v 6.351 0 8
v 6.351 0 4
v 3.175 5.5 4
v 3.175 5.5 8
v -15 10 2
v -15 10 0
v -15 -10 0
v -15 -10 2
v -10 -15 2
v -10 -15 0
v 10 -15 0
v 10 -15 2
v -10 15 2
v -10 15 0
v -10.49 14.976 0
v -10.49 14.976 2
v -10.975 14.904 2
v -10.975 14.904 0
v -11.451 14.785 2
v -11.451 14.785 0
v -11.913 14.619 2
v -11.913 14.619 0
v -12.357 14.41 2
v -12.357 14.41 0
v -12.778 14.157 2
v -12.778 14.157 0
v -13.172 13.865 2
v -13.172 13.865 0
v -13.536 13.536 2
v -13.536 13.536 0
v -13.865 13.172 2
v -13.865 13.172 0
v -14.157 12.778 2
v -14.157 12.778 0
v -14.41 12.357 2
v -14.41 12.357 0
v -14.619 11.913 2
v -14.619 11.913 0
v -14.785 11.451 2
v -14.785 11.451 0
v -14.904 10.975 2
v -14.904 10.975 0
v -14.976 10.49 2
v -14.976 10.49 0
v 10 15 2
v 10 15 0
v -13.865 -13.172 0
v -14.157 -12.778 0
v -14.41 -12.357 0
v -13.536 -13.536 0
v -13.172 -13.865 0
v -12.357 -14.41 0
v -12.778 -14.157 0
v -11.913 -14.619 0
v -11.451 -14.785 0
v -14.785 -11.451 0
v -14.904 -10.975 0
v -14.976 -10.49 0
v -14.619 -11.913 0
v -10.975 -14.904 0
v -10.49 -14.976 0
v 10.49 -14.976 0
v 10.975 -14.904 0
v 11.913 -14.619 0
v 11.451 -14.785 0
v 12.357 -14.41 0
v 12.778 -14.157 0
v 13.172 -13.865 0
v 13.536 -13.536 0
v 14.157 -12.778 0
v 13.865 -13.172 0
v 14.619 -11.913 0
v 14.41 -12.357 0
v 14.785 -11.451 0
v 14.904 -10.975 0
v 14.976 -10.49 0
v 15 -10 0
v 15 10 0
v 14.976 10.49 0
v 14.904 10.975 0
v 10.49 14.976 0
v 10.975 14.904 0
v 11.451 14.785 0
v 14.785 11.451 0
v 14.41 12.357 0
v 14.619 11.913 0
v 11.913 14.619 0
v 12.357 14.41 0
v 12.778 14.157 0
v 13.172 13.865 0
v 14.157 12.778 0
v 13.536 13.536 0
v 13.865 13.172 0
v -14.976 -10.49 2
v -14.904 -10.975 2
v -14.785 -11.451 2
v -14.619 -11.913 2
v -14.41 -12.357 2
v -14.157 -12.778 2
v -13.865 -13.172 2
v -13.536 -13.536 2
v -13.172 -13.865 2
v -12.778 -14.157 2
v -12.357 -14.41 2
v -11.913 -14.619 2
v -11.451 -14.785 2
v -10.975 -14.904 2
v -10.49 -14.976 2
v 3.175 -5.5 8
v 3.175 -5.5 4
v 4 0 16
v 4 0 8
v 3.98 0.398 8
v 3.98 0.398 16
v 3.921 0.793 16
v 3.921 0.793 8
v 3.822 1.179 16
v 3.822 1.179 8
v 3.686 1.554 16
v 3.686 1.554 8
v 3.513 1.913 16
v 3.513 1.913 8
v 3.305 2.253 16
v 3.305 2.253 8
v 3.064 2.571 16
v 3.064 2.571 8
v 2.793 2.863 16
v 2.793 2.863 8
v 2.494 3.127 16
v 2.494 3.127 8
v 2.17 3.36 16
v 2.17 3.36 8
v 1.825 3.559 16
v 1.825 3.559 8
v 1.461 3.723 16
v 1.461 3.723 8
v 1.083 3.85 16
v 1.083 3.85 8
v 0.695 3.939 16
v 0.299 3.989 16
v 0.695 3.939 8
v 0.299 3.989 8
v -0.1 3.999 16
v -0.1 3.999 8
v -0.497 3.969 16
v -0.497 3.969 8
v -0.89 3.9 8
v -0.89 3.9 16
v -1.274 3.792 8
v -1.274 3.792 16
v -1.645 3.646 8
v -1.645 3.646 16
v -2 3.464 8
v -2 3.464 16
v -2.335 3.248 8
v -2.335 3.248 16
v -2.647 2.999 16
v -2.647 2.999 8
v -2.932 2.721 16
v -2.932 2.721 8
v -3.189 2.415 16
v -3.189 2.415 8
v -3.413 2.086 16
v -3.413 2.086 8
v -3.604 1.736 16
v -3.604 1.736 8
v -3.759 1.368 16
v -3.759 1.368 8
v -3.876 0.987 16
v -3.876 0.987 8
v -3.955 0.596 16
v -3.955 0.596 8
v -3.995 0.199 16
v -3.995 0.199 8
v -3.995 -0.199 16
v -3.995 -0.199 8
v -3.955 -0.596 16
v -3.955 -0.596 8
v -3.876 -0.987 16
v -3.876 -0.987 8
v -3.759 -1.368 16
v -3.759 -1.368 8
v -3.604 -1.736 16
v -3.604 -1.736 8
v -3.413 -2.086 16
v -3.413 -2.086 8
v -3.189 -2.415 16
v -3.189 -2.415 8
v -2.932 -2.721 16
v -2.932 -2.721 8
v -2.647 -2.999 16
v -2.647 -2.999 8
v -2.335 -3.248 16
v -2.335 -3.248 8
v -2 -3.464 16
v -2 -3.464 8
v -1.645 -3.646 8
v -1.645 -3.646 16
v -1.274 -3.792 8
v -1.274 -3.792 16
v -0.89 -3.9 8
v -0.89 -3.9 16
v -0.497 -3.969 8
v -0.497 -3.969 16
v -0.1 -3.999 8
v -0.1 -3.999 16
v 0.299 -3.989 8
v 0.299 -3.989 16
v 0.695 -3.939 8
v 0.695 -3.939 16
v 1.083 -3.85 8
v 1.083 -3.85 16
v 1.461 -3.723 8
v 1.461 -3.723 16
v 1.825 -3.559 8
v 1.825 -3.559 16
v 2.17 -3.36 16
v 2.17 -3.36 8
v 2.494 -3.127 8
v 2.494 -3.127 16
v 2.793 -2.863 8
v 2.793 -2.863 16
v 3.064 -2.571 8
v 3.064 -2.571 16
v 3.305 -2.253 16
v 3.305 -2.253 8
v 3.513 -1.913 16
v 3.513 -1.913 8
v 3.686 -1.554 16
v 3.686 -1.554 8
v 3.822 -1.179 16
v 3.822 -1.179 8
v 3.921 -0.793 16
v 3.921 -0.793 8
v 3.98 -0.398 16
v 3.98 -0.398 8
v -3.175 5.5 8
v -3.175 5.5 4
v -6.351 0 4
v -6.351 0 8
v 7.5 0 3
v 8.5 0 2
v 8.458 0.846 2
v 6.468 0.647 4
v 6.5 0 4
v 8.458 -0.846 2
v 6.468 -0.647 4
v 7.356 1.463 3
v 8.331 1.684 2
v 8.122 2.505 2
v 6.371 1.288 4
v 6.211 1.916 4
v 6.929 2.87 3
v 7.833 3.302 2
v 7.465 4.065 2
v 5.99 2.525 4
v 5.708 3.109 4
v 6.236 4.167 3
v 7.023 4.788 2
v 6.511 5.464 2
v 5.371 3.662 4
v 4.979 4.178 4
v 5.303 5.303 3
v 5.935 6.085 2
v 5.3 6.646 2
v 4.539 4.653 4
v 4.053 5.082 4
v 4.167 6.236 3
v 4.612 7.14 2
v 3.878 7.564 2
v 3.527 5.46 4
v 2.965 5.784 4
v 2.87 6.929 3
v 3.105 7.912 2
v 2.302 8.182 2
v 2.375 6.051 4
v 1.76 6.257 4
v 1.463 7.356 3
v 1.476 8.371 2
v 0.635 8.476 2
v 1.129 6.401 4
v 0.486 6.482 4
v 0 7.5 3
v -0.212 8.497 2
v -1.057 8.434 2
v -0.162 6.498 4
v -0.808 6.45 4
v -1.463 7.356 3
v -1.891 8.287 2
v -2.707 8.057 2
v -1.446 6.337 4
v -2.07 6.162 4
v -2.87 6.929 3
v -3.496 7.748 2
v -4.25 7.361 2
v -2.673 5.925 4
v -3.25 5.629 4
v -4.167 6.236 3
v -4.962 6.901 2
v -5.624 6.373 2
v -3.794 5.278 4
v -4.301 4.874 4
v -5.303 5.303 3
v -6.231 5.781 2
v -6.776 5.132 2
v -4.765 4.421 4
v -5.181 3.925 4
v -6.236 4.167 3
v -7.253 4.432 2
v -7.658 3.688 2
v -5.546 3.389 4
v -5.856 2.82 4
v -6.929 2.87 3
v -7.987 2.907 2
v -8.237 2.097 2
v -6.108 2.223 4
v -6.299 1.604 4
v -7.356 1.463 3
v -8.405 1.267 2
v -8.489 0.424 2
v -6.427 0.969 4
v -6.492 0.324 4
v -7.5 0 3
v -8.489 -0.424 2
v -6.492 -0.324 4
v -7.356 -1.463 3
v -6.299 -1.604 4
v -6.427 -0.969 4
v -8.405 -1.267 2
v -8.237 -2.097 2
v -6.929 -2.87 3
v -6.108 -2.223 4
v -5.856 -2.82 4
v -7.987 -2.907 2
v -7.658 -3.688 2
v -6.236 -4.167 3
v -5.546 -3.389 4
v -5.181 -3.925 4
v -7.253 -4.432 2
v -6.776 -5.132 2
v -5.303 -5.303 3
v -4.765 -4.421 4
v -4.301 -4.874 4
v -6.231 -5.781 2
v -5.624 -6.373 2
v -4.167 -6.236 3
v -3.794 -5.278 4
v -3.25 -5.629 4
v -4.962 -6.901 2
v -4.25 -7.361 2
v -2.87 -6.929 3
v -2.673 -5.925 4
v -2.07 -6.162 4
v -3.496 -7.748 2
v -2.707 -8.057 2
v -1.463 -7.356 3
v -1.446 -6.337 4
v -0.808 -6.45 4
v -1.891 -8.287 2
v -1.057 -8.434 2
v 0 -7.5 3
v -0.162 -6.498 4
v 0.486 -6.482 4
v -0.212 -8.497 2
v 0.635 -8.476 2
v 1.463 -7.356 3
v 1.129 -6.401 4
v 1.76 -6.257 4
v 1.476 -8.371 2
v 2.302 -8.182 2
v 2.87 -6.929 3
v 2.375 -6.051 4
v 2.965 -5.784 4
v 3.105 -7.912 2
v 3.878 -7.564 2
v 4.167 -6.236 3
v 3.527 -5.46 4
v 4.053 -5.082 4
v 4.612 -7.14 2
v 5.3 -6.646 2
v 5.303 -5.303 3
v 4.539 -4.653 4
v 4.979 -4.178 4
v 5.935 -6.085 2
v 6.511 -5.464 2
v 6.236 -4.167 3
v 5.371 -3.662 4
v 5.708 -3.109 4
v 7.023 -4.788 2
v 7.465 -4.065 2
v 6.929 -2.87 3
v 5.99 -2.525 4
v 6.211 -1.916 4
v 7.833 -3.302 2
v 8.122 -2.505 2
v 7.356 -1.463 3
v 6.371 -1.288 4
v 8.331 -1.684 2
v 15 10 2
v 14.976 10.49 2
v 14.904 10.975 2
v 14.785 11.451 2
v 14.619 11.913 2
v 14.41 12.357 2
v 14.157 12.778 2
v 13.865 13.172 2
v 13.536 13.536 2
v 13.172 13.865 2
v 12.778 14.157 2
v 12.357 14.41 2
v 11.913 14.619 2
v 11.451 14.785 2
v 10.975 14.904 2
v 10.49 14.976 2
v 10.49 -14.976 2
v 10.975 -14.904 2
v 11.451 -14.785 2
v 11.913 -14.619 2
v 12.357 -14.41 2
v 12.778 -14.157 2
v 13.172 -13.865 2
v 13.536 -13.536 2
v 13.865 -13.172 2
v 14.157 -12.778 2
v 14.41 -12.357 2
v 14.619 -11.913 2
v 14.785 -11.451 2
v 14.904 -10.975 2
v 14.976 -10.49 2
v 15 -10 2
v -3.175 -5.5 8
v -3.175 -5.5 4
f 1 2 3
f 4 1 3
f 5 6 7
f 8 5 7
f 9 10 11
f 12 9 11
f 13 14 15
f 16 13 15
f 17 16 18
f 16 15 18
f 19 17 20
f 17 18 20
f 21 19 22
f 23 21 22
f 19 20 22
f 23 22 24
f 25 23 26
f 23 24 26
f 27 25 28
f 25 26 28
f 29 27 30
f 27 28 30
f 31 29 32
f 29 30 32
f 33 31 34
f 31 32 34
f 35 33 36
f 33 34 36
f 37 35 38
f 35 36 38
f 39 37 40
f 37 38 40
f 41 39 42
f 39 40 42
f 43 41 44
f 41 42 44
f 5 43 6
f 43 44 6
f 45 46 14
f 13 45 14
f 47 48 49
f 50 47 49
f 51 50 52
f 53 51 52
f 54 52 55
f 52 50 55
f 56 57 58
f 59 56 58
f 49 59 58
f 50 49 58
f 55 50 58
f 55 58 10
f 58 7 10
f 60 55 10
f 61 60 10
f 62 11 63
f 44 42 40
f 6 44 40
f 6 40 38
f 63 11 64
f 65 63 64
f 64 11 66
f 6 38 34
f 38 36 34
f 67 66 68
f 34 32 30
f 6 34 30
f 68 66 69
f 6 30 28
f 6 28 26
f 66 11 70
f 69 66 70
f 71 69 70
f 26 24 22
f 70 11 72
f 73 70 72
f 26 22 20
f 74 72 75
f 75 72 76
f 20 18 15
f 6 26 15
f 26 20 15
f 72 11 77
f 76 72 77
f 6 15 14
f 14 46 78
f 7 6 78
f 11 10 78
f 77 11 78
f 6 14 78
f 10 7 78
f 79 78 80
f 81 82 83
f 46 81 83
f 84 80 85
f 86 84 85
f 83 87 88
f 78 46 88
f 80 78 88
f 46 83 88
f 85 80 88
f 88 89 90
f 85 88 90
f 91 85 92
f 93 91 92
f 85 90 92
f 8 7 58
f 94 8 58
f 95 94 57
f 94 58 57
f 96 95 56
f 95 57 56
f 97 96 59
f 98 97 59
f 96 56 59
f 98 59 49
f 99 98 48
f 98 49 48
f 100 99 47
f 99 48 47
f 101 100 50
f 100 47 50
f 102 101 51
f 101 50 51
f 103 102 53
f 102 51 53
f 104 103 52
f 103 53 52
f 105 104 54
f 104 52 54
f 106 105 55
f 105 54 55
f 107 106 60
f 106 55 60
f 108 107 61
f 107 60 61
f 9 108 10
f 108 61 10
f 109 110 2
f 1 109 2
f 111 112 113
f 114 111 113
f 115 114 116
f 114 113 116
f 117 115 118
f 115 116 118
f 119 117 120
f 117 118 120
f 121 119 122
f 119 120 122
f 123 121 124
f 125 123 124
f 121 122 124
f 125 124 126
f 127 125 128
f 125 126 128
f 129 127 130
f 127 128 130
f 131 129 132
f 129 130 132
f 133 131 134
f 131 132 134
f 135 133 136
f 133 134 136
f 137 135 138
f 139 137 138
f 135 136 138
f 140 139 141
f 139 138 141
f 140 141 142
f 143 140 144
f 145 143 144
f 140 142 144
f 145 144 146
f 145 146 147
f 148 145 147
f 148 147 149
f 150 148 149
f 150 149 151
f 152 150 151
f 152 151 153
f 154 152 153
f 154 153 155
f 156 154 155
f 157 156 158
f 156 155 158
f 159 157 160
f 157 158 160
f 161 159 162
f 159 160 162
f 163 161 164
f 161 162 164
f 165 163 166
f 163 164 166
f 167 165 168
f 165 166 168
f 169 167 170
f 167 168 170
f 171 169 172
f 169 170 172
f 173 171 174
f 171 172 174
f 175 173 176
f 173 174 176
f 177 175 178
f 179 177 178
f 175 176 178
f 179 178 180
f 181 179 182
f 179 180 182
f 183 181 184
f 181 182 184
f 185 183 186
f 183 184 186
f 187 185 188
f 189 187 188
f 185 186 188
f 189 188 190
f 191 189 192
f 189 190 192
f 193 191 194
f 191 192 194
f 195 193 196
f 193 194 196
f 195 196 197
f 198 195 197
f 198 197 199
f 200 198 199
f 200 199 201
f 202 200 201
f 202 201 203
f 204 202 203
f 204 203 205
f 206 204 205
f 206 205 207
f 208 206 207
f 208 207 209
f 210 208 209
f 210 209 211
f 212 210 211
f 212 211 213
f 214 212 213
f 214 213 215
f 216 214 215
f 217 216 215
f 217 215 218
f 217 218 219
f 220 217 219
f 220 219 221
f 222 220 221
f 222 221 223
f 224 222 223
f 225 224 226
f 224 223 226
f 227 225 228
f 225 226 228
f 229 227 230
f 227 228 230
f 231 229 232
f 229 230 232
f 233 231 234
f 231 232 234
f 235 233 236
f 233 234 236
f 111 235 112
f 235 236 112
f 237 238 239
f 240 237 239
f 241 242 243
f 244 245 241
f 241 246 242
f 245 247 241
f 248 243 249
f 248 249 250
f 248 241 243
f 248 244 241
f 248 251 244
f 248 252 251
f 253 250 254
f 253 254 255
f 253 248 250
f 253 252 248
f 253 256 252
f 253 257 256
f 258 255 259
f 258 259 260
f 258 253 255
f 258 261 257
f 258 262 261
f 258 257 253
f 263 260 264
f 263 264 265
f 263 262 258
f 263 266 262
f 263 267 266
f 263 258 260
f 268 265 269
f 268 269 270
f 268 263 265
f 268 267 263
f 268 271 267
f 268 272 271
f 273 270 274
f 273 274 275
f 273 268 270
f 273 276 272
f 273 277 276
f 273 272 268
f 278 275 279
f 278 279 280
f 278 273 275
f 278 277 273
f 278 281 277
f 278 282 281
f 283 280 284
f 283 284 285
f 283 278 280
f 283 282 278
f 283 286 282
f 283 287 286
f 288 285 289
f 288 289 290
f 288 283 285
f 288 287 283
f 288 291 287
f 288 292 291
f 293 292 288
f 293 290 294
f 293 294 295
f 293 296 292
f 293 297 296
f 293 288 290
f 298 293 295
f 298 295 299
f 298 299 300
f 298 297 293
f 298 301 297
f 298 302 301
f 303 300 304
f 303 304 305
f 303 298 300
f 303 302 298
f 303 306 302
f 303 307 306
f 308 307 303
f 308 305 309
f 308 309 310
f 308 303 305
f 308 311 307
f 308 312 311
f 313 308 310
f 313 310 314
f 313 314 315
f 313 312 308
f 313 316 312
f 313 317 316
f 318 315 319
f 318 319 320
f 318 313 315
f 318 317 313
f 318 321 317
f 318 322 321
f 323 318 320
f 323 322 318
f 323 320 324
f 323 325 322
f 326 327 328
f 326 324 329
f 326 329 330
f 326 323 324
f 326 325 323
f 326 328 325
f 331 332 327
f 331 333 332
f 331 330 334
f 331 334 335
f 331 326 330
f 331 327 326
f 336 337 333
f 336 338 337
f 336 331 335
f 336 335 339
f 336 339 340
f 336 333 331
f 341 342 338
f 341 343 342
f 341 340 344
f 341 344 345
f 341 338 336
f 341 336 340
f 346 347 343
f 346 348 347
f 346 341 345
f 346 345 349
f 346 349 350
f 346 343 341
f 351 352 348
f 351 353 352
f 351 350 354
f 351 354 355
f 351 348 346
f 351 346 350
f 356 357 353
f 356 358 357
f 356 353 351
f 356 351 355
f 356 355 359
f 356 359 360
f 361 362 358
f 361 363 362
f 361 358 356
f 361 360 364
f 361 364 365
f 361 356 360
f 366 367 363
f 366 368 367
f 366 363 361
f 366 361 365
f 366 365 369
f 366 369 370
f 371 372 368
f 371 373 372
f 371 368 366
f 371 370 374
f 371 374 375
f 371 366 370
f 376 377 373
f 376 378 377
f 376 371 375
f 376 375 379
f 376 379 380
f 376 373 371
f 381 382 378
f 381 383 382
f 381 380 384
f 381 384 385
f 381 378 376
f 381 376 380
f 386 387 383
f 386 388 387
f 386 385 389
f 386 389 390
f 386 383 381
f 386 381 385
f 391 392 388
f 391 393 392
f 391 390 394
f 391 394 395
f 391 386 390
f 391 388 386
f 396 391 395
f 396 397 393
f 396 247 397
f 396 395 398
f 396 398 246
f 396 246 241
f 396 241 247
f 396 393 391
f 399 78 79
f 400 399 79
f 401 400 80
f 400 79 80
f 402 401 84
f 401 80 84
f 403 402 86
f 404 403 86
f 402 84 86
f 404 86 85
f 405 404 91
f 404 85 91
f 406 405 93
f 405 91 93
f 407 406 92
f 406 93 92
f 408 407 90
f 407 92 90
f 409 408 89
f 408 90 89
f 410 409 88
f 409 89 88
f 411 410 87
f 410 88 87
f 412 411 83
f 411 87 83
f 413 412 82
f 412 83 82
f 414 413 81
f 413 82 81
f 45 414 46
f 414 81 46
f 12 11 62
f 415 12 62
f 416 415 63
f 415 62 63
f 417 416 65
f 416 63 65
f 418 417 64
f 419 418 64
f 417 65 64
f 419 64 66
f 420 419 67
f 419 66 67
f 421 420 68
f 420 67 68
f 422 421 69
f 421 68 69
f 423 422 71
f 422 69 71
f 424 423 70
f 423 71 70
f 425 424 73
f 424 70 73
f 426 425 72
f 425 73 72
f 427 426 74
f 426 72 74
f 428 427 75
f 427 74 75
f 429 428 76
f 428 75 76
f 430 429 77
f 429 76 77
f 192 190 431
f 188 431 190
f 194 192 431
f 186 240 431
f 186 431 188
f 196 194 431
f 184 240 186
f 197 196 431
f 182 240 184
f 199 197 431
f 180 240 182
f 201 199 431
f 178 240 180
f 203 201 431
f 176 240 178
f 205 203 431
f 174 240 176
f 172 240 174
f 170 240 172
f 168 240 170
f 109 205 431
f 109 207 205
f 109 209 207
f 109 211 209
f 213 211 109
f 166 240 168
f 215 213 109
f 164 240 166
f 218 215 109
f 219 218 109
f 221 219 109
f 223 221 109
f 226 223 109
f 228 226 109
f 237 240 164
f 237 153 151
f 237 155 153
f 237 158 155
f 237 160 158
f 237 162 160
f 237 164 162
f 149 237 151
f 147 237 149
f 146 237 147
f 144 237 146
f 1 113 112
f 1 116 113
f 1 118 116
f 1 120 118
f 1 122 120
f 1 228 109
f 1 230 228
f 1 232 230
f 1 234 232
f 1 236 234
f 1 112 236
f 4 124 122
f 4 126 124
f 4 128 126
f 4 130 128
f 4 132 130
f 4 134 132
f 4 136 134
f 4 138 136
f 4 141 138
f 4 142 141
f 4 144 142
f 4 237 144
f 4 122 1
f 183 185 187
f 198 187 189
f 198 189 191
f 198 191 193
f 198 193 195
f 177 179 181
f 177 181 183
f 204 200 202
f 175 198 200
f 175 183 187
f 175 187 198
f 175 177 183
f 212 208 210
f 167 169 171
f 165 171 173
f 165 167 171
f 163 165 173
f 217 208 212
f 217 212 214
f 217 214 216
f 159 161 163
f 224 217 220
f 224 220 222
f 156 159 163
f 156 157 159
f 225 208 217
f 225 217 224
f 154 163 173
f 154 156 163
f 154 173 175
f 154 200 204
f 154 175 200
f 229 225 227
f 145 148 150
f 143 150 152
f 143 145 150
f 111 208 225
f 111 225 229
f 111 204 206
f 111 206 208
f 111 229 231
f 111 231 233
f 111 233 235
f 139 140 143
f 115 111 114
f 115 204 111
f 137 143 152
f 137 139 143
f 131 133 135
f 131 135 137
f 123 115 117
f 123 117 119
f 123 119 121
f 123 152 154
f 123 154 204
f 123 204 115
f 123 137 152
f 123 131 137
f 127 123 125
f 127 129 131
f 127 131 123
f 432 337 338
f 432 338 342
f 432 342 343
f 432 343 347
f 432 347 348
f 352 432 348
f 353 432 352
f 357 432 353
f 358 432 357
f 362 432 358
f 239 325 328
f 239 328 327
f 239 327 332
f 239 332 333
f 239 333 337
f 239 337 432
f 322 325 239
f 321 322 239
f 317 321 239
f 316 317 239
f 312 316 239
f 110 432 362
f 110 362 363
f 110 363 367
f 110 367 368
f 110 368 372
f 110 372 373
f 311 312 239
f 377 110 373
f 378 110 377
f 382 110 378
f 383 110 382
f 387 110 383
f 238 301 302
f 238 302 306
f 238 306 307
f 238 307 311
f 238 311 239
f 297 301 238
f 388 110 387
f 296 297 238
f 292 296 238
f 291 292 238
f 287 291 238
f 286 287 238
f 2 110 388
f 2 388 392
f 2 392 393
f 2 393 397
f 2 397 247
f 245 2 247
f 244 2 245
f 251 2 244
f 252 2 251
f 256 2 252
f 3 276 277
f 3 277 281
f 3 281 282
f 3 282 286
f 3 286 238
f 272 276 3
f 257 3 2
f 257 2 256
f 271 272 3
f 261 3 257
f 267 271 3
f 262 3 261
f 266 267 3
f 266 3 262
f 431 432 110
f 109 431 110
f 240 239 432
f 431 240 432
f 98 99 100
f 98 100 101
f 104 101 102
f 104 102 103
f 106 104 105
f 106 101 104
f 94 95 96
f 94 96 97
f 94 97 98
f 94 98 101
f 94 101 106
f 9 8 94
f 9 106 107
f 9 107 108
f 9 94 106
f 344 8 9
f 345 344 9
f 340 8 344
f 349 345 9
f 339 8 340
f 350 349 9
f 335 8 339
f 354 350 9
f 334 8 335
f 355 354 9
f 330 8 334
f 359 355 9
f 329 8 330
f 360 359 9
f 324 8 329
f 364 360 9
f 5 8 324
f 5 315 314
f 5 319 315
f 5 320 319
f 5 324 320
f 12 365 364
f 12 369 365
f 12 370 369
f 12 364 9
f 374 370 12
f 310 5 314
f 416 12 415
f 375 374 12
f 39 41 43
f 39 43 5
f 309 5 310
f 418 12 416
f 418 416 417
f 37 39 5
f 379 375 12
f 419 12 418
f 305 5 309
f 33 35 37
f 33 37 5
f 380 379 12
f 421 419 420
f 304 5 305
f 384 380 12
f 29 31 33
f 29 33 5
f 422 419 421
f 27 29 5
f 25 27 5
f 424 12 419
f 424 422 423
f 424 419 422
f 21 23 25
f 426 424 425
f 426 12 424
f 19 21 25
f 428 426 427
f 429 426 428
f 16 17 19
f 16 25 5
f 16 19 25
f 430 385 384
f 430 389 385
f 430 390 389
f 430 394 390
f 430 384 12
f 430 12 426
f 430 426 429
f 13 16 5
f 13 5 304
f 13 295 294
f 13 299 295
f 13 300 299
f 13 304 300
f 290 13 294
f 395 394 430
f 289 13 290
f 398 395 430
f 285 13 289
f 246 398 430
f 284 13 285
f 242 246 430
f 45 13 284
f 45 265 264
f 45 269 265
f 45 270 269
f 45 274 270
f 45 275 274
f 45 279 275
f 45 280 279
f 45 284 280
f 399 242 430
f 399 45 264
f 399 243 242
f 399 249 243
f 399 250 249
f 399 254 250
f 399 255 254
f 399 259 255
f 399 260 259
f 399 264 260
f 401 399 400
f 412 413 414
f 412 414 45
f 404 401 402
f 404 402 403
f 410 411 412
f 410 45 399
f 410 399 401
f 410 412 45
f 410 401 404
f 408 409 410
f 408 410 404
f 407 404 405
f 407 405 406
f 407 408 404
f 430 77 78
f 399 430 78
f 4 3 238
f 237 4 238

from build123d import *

# Parameters (mm, degrees)
F1_DEPTH = 2
F2_R     = 8.5
F3_DEPTH = 2
F4_SIZE  = 1.99999
F6_DEPTH = 4
F7_R     = 4
F8_DEPTH = 8


# Not quite as in the source:
# - a fillet or chamfer is up to 0.001 mm smaller than in the source, because OpenCascade refuses the exact size


with BuildPart() as f1:
    # F0 (on Top) → F1 (new body)
    with BuildSketch(Plane.XY):
        with BuildLine():
            ThreePointArc((15, 10), (13.5355339059, 13.5355339059), (10, 15))
            Line((10, 15), (-10, 15))
            ThreePointArc((-10, 15), (-13.5355339059, 13.5355339059), (-15, 10))
            Line((-15, 10), (-15, -10))
            ThreePointArc((-15, -10), (-13.5355339059, -13.5355339059), (-10, -15))
            Line((-10, -15), (10, -15))
            ThreePointArc((10, -15), (13.5355339059, -13.5355339059), (15, -10))
            Line((15, -10), (15, 10))
        make_face()
    extrude(amount=F1_DEPTH)

    # F2 (on face) → F3 (join)
    with BuildSketch(Plane.XY.offset(2)):
        Circle(F2_R)
    extrude(amount=F3_DEPTH)

    # F4 (size 2 in the source; OpenCascade refuses exactly that, so slightly less here)
    f4_edges = [f1.edges().sort_by_distance(p)[0] for p in [
        (-8.5, 0, 4),
    ]]
    chamfer(f4_edges, length=F4_SIZE)

    # F5 (on face) → F6 (join)
    with BuildSketch(Plane.XY.offset(4)):
        Polygon((6.3508529611, 0), (3.1754264805, 5.5), (-3.1754264805, 5.5), (-6.3508529611, 0), (-3.1754264805, -5.5), (3.1754264805, -5.5), align=None)
    extrude(amount=F6_DEPTH)

    # F7 (on face) → F8 (join)
    with BuildSketch(Plane.XY.offset(8)):
        Circle(F7_R)
    extrude(amount=F8_DEPTH)


solid = f1.part
